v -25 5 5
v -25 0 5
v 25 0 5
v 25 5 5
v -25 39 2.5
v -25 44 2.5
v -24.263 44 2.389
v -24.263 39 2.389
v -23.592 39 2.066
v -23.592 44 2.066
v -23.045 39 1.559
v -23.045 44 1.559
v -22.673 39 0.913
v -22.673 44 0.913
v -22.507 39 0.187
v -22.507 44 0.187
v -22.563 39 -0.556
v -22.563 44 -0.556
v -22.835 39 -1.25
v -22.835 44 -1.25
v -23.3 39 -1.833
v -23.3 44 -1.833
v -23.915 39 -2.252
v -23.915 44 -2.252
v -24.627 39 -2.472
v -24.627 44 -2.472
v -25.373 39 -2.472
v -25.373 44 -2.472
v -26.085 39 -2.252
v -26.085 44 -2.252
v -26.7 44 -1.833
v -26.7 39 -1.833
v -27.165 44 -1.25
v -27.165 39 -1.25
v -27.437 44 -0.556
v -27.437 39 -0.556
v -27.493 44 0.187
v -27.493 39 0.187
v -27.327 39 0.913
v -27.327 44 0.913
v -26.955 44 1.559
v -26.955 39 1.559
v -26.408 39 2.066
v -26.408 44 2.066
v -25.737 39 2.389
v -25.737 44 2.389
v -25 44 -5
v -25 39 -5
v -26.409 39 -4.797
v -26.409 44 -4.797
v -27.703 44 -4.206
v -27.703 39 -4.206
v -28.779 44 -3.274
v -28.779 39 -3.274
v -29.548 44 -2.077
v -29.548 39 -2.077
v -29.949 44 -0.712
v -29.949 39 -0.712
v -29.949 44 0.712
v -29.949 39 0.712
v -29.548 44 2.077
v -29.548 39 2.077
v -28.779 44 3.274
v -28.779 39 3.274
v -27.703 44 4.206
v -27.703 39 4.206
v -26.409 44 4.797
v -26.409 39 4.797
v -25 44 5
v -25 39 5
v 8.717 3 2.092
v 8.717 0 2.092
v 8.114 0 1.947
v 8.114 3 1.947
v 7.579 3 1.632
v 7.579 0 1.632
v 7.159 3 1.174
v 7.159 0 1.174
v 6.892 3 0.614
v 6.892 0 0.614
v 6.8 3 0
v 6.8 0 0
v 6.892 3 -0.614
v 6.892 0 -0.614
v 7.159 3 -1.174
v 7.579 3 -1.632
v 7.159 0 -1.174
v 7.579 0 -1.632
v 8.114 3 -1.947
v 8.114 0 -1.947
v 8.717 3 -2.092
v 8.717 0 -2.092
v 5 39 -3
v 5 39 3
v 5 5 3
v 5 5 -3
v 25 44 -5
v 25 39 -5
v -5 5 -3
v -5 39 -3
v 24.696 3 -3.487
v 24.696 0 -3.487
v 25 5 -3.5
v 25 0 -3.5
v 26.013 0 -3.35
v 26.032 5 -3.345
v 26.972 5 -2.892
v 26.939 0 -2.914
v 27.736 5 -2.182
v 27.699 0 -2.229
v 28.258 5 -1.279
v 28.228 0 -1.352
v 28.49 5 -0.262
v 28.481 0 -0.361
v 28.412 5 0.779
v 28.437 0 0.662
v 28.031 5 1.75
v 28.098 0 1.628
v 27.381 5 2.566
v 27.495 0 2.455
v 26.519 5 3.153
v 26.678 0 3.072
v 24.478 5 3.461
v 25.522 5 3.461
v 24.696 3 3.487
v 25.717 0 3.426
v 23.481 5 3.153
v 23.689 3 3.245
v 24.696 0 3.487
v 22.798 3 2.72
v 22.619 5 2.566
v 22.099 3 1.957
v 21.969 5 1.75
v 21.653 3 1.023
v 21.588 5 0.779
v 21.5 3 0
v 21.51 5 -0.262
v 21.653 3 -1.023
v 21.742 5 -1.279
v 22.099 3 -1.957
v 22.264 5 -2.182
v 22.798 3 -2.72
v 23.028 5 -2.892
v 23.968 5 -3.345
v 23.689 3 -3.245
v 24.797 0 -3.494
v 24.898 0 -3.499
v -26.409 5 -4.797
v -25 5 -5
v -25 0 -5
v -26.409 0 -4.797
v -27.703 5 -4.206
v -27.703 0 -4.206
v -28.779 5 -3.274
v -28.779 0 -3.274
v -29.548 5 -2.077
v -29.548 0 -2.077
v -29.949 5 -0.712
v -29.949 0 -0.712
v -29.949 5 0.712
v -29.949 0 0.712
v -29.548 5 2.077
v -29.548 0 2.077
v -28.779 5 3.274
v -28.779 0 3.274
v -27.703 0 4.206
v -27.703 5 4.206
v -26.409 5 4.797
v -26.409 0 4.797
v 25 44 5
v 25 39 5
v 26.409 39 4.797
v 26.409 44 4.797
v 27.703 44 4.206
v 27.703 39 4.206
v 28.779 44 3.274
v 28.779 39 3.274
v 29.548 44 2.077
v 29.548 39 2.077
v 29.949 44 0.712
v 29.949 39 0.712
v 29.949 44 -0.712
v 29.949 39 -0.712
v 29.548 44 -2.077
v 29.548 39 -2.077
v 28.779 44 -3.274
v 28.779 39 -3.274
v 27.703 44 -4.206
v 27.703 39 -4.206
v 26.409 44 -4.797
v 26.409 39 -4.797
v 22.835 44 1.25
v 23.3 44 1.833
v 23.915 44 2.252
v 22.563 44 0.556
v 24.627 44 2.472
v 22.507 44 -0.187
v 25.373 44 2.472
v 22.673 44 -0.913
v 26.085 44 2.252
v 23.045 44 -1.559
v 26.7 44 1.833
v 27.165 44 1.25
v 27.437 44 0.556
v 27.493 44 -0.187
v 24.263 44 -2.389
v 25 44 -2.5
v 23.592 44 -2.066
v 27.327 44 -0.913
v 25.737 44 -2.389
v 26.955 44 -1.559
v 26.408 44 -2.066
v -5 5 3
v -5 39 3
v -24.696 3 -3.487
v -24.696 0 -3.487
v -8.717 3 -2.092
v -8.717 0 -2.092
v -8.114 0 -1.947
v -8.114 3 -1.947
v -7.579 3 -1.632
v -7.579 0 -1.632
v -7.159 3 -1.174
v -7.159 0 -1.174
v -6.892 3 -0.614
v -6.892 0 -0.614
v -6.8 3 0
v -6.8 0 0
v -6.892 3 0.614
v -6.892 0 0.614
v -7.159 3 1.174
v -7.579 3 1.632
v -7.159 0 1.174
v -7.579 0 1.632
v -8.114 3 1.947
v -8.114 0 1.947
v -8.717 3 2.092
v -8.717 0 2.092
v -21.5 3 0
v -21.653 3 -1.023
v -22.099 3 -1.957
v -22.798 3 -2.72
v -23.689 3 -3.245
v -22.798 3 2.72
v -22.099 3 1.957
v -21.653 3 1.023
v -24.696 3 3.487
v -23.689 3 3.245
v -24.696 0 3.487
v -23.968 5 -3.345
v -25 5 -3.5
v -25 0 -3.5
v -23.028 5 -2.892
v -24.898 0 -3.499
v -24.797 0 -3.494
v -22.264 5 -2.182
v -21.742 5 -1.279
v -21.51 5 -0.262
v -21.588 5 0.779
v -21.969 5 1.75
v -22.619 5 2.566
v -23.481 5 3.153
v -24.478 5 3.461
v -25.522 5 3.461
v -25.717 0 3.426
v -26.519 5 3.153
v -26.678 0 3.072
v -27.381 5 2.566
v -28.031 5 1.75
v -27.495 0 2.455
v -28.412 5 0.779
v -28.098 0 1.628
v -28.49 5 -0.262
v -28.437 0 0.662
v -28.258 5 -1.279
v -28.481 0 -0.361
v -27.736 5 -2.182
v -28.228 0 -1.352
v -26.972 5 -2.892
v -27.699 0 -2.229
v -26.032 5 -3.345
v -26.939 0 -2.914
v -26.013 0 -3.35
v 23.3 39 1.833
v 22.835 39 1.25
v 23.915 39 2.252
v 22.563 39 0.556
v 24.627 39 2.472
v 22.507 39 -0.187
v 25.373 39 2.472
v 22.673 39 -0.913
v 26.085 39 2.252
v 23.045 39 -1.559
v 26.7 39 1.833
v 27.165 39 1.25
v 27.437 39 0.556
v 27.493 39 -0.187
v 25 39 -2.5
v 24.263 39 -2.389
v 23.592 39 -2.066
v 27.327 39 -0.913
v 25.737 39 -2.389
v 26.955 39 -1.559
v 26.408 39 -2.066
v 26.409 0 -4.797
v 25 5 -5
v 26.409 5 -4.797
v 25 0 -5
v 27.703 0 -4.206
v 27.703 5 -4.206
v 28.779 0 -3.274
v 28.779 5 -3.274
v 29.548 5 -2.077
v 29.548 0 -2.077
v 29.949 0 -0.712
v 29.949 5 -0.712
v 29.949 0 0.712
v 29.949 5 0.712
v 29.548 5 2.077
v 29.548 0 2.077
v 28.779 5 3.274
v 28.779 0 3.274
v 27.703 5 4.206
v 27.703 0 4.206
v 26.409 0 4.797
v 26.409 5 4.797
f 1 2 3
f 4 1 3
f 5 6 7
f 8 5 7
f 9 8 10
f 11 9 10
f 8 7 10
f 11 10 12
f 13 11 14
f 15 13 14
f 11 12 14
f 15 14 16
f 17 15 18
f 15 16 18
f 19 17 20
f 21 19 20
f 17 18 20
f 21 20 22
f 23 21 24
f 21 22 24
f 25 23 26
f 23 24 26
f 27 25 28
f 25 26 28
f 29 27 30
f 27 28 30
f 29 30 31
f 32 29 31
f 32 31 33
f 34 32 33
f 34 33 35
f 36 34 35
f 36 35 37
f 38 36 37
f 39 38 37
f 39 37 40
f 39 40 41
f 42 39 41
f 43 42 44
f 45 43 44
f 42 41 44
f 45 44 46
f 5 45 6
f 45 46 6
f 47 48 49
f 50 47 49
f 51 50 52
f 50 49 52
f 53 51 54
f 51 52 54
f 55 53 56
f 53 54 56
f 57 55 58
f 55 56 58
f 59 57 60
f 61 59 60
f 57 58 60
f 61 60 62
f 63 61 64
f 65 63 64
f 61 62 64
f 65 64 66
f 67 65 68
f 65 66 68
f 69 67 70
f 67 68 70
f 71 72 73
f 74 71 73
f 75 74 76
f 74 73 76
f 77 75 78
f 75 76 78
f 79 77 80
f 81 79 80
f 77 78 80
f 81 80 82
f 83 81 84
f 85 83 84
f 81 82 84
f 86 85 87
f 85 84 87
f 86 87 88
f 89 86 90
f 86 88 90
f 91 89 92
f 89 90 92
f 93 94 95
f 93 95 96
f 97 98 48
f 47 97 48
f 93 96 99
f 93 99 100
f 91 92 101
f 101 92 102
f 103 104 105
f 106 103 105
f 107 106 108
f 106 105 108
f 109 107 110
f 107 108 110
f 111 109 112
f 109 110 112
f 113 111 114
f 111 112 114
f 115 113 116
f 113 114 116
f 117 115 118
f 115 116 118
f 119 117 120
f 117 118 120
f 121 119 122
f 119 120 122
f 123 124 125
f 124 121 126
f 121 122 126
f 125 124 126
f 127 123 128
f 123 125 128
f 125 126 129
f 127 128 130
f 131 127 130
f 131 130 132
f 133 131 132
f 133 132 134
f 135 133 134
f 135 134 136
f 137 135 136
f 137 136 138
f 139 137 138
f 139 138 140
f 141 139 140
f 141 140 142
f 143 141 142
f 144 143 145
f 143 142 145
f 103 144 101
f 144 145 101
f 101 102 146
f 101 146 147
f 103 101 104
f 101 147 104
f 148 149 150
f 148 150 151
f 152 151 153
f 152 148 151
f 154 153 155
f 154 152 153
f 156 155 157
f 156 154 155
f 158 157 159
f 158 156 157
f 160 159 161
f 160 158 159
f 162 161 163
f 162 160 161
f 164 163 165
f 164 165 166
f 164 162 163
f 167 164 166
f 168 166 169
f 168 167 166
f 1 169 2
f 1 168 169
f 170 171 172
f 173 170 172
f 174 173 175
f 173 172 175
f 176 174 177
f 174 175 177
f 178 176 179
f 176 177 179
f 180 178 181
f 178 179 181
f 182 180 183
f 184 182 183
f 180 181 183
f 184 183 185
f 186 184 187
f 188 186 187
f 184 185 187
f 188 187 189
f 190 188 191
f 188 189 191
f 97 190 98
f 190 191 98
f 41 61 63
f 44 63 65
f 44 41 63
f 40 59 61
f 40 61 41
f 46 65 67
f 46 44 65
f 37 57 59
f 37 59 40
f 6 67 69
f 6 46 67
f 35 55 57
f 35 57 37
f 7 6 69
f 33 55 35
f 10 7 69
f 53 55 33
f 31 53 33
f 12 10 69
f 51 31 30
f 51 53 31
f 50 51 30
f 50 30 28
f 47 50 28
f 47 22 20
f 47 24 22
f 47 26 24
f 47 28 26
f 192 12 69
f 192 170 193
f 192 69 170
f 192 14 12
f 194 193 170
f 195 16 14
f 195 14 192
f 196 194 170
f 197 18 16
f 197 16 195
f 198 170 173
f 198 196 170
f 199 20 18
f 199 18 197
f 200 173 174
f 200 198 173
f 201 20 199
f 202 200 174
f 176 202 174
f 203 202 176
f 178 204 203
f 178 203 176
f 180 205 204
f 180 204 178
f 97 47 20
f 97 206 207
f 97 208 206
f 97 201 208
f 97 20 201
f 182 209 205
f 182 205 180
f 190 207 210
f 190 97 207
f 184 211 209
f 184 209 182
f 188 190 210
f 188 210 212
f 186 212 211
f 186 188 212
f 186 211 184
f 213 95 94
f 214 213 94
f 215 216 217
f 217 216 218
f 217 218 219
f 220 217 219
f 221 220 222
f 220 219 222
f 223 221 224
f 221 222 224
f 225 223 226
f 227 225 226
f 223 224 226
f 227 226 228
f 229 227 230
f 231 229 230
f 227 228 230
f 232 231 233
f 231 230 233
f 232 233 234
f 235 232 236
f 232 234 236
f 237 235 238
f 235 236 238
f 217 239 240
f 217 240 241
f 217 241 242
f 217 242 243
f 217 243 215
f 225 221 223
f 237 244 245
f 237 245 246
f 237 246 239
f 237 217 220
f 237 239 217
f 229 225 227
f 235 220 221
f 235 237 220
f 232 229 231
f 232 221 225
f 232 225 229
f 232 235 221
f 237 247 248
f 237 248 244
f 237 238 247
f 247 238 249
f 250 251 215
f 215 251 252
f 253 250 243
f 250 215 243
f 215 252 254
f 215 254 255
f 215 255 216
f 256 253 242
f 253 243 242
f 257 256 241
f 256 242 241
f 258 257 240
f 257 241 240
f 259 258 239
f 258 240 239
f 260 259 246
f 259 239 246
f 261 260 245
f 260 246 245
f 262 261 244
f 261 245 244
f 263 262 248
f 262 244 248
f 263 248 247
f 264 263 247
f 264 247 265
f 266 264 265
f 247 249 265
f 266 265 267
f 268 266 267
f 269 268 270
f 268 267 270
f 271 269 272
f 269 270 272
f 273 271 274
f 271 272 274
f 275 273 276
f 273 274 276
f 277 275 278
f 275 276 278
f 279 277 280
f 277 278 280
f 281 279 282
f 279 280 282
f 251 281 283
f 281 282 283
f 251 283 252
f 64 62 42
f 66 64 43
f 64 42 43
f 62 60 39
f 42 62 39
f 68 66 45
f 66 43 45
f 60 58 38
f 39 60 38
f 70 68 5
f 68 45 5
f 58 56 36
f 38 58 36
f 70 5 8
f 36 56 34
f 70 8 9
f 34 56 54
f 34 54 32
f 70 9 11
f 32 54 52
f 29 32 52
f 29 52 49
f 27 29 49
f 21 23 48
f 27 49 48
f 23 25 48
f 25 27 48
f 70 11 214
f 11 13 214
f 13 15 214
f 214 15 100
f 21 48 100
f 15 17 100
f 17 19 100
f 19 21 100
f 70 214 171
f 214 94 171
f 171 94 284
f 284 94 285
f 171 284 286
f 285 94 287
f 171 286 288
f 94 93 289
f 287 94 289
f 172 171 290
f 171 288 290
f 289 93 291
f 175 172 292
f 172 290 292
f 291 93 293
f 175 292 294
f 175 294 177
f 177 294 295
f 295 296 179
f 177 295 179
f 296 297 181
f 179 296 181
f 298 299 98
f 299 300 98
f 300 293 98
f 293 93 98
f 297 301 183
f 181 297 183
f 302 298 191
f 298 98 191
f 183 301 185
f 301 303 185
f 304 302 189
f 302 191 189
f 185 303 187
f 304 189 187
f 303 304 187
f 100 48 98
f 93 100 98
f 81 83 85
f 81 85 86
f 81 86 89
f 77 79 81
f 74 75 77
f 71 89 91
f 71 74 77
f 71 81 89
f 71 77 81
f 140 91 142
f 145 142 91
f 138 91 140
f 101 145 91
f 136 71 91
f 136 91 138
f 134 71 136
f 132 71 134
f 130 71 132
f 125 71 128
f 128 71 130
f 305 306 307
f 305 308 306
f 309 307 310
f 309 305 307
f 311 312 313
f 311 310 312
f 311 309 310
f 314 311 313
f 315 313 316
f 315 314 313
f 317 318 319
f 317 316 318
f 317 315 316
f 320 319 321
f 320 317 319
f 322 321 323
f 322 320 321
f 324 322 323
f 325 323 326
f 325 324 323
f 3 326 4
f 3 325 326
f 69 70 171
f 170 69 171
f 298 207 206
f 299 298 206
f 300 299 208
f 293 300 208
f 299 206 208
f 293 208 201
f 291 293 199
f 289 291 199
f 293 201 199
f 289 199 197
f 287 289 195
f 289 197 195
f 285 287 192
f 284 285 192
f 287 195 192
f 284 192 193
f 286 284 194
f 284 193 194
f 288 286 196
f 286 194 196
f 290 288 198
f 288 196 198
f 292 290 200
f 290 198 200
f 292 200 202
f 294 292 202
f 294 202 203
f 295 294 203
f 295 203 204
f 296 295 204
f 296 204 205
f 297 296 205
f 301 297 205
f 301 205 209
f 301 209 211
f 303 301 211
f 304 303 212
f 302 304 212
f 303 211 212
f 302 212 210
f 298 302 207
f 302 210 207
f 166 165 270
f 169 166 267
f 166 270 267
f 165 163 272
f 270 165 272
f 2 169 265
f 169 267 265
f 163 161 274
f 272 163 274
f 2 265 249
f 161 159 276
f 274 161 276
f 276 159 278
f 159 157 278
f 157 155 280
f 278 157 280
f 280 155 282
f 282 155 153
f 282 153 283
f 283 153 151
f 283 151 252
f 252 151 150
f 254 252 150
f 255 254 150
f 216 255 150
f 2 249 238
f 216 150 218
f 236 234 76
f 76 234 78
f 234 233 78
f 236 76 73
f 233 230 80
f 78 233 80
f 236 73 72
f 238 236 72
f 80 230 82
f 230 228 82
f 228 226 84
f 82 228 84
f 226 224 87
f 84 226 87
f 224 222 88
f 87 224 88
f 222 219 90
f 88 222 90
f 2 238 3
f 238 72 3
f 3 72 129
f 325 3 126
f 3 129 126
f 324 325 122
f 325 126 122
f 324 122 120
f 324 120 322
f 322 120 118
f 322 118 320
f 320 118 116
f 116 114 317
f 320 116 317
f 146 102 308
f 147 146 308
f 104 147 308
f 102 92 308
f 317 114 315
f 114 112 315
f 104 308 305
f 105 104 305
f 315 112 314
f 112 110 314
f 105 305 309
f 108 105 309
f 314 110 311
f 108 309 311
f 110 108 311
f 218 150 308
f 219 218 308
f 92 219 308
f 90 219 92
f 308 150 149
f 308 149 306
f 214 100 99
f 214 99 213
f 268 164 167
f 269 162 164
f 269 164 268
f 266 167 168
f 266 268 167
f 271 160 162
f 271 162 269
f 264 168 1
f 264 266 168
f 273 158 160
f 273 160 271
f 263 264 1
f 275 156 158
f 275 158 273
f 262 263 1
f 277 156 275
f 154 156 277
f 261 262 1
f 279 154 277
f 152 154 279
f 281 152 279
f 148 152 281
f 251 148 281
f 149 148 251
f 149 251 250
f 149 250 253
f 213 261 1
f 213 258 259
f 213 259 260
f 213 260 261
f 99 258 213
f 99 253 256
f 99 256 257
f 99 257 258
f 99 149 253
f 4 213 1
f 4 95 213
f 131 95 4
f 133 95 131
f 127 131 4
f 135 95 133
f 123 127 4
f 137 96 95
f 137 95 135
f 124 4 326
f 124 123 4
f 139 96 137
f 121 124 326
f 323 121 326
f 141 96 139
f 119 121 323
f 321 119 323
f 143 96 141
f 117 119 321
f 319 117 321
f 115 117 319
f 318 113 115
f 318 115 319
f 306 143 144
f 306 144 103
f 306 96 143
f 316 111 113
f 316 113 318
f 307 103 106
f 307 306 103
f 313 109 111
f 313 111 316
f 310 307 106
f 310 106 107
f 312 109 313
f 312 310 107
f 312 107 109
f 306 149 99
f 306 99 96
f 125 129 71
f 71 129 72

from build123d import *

# Parameters (mm, degrees)
SKETCH2_W           = 60
SKETCH2_H           = 10
BOSS_EXTRUDE1_DEPTH = 5
FILLET1_RADIUS      = 5
FILLET1_LENGTH      = 5
FILLET2_RADIUS      = 5
FILLET2_LENGTH      = 5
SKETCH11_W          = 4.99996664
SKETCH11_H          = 10
BOSS_EXTRUDE3_DEPTH = 34
SKETCH12_W          = 2
SKETCH12_H          = 34
CUT_EXTRUDE6_DEPTH  = 18
BOSS_EXTRUDE4_DEPTH = 5
SKETCH14_R          = 2.5
CUT_EXTRUDE7_DEPTH  = 5
SKETCH15_R          = 3.5
CUT_EXTRUDE8_DEPTH  = 5
CUT_EXTRUDE10_DEPTH = 3


with BuildPart() as part:
    # Sketch2 → Boss-Extrude1 (new body)
    with BuildSketch(Plane(origin=(0, 0, 0), x_dir=(1, 0, 0), z_dir=(0, 1, 0))):
        Rectangle(SKETCH2_W, SKETCH2_H)
    extrude(amount=BOSS_EXTRUDE1_DEPTH)

    # Fillet1: full round fillet: the end face becomes a half cylinder, R = half its width
    fillet1_face = Plane((-30, 2.5, 0), x_dir=(0, 1, 0), z_dir=(-1, 0, 0))  # on the end face: x along it, z out of the body
    fillet1_slab = fillet1_face.offset(-FILLET1_RADIUS / 2) * Box(FILLET1_LENGTH, 2 * FILLET1_RADIUS, FILLET1_RADIUS, mode=Mode.PRIVATE)  # the body's end, R deep
    fillet1_round = Plane((-25, 2.5, 0), x_dir=(-1, 0, 0), z_dir=(0, 1, 0)) * Cylinder(FILLET1_RADIUS, FILLET1_LENGTH, mode=Mode.PRIVATE)  # its axis R under the face
    add(fillet1_slab - fillet1_round, mode=Mode.SUBTRACT)

    # Fillet2: full round fillet: the end face becomes a half cylinder, R = half its width
    fillet2_face = Plane((30, 2.5, 0), x_dir=(0, -1, 0), z_dir=(1, 0, 0))  # on the end face: x along it, z out of the body
    fillet2_slab = fillet2_face.offset(-FILLET2_RADIUS / 2) * Box(FILLET2_LENGTH, 2 * FILLET2_RADIUS, FILLET2_RADIUS, mode=Mode.PRIVATE)  # the body's end, R deep
    fillet2_round = Plane((25, 2.5, 0), x_dir=(1, 0, 0), z_dir=(0, -1, 0)) * Cylinder(FILLET2_RADIUS, FILLET2_LENGTH, mode=Mode.PRIVATE)  # its axis R under the face
    add(fillet2_slab - fillet2_round, mode=Mode.SUBTRACT)

    # Sketch11 → Boss-Extrude3 (add)
    with BuildSketch(Plane(origin=(0, 5, 0), x_dir=(1, 0, 0), z_dir=(0, 1, 0))):
        with Locations((2.49998332, 0)):
            Rectangle(SKETCH11_W, SKETCH11_H)
        Polygon((0, -5), (0, 5), (-4.99996664, 4.981735201), (-4.99996664, -5), align=None)
    extrude(amount=BOSS_EXTRUDE3_DEPTH)

    # Sketch12 → Cut-Extrude6 (cut)
    with BuildSketch(Plane(origin=(4.99996664, 0, 0), x_dir=(0, 0, -1), z_dir=(1, 0, 0))):
        with Locations((-4, 22)):
            Rectangle(SKETCH12_W, SKETCH12_H)
        with Locations((4, 22)):
            Rectangle(SKETCH12_W, SKETCH12_H)
    extrude(amount=-CUT_EXTRUDE6_DEPTH, mode=Mode.SUBTRACT)

    # Sketch13 → Boss-Extrude4 (add)
    with BuildSketch(Plane(origin=(0, 39, 0), x_dir=(1, 0, 0), z_dir=(0, 1, 0))):
        with BuildLine():
            Line((25, 5), (-25, 5))
            ThreePointArc((-25, 5), (-30, 0), (-25, -5))
            Line((-25, -5), (25, -5))
            ThreePointArc((25, -5), (30, 0), (25, 5))
        make_face()
    extrude(amount=BOSS_EXTRUDE4_DEPTH)

    # Sketch14 → Cut-Extrude7 (cut)
    with BuildSketch(Plane(origin=(0, 44, 0), x_dir=(1, 0, 0), z_dir=(0, 1, 0))):
        with Locations(Location((-25, 0, 0), (0, 0, 270))):
            Circle(SKETCH14_R)
        with Locations(Location((25, 0, 0), (0, 0, 90))):
            Circle(SKETCH14_R)
    extrude(amount=-CUT_EXTRUDE7_DEPTH, mode=Mode.SUBTRACT)

    # Sketch15 → Cut-Extrude8 (cut)
    with BuildSketch(Plane.XZ):
        with Locations(Location((-25, 0, 0), (0, 0, 270))):
            Circle(SKETCH15_R)
        with Locations(Location((25, 0, 0), (0, 0, 270))):
            Circle(SKETCH15_R)
    extrude(amount=-CUT_EXTRUDE8_DEPTH, mode=Mode.SUBTRACT)

    # Sketch18 → Cut-Extrude10 (cut)
    with BuildSketch(Plane.XZ):
        with BuildLine():
            ThreePointArc((-24.695652174, 3.486742377), (-21.5, 0), (-24.695652174, -3.486742377))
            Line((-24.695652174, -3.486742377), (-8.717391304, -2.092045426))
            ThreePointArc((-8.717391304, -2.092045426), (-6.8, 0), (-8.717391304, 2.092045426))
            Line((-8.717391304, 2.092045426), (-24.695652174, 3.486742377))
        make_face()
        with BuildLine():
            Line((8.717391304, -2.092045426), (24.695652174, -3.486742377))
            ThreePointArc((24.695652174, -3.486742377), (21.5, 0), (24.695652174, 3.486742377))
            Line((24.695652174, 3.486742377), (8.717391304, 2.092045426))
            ThreePointArc((8.717391304, 2.092045426), (6.8, 0), (8.717391304, -2.092045426))
        make_face()
    extrude(amount=-CUT_EXTRUDE10_DEPTH, mode=Mode.SUBTRACT)


solid = part.part
